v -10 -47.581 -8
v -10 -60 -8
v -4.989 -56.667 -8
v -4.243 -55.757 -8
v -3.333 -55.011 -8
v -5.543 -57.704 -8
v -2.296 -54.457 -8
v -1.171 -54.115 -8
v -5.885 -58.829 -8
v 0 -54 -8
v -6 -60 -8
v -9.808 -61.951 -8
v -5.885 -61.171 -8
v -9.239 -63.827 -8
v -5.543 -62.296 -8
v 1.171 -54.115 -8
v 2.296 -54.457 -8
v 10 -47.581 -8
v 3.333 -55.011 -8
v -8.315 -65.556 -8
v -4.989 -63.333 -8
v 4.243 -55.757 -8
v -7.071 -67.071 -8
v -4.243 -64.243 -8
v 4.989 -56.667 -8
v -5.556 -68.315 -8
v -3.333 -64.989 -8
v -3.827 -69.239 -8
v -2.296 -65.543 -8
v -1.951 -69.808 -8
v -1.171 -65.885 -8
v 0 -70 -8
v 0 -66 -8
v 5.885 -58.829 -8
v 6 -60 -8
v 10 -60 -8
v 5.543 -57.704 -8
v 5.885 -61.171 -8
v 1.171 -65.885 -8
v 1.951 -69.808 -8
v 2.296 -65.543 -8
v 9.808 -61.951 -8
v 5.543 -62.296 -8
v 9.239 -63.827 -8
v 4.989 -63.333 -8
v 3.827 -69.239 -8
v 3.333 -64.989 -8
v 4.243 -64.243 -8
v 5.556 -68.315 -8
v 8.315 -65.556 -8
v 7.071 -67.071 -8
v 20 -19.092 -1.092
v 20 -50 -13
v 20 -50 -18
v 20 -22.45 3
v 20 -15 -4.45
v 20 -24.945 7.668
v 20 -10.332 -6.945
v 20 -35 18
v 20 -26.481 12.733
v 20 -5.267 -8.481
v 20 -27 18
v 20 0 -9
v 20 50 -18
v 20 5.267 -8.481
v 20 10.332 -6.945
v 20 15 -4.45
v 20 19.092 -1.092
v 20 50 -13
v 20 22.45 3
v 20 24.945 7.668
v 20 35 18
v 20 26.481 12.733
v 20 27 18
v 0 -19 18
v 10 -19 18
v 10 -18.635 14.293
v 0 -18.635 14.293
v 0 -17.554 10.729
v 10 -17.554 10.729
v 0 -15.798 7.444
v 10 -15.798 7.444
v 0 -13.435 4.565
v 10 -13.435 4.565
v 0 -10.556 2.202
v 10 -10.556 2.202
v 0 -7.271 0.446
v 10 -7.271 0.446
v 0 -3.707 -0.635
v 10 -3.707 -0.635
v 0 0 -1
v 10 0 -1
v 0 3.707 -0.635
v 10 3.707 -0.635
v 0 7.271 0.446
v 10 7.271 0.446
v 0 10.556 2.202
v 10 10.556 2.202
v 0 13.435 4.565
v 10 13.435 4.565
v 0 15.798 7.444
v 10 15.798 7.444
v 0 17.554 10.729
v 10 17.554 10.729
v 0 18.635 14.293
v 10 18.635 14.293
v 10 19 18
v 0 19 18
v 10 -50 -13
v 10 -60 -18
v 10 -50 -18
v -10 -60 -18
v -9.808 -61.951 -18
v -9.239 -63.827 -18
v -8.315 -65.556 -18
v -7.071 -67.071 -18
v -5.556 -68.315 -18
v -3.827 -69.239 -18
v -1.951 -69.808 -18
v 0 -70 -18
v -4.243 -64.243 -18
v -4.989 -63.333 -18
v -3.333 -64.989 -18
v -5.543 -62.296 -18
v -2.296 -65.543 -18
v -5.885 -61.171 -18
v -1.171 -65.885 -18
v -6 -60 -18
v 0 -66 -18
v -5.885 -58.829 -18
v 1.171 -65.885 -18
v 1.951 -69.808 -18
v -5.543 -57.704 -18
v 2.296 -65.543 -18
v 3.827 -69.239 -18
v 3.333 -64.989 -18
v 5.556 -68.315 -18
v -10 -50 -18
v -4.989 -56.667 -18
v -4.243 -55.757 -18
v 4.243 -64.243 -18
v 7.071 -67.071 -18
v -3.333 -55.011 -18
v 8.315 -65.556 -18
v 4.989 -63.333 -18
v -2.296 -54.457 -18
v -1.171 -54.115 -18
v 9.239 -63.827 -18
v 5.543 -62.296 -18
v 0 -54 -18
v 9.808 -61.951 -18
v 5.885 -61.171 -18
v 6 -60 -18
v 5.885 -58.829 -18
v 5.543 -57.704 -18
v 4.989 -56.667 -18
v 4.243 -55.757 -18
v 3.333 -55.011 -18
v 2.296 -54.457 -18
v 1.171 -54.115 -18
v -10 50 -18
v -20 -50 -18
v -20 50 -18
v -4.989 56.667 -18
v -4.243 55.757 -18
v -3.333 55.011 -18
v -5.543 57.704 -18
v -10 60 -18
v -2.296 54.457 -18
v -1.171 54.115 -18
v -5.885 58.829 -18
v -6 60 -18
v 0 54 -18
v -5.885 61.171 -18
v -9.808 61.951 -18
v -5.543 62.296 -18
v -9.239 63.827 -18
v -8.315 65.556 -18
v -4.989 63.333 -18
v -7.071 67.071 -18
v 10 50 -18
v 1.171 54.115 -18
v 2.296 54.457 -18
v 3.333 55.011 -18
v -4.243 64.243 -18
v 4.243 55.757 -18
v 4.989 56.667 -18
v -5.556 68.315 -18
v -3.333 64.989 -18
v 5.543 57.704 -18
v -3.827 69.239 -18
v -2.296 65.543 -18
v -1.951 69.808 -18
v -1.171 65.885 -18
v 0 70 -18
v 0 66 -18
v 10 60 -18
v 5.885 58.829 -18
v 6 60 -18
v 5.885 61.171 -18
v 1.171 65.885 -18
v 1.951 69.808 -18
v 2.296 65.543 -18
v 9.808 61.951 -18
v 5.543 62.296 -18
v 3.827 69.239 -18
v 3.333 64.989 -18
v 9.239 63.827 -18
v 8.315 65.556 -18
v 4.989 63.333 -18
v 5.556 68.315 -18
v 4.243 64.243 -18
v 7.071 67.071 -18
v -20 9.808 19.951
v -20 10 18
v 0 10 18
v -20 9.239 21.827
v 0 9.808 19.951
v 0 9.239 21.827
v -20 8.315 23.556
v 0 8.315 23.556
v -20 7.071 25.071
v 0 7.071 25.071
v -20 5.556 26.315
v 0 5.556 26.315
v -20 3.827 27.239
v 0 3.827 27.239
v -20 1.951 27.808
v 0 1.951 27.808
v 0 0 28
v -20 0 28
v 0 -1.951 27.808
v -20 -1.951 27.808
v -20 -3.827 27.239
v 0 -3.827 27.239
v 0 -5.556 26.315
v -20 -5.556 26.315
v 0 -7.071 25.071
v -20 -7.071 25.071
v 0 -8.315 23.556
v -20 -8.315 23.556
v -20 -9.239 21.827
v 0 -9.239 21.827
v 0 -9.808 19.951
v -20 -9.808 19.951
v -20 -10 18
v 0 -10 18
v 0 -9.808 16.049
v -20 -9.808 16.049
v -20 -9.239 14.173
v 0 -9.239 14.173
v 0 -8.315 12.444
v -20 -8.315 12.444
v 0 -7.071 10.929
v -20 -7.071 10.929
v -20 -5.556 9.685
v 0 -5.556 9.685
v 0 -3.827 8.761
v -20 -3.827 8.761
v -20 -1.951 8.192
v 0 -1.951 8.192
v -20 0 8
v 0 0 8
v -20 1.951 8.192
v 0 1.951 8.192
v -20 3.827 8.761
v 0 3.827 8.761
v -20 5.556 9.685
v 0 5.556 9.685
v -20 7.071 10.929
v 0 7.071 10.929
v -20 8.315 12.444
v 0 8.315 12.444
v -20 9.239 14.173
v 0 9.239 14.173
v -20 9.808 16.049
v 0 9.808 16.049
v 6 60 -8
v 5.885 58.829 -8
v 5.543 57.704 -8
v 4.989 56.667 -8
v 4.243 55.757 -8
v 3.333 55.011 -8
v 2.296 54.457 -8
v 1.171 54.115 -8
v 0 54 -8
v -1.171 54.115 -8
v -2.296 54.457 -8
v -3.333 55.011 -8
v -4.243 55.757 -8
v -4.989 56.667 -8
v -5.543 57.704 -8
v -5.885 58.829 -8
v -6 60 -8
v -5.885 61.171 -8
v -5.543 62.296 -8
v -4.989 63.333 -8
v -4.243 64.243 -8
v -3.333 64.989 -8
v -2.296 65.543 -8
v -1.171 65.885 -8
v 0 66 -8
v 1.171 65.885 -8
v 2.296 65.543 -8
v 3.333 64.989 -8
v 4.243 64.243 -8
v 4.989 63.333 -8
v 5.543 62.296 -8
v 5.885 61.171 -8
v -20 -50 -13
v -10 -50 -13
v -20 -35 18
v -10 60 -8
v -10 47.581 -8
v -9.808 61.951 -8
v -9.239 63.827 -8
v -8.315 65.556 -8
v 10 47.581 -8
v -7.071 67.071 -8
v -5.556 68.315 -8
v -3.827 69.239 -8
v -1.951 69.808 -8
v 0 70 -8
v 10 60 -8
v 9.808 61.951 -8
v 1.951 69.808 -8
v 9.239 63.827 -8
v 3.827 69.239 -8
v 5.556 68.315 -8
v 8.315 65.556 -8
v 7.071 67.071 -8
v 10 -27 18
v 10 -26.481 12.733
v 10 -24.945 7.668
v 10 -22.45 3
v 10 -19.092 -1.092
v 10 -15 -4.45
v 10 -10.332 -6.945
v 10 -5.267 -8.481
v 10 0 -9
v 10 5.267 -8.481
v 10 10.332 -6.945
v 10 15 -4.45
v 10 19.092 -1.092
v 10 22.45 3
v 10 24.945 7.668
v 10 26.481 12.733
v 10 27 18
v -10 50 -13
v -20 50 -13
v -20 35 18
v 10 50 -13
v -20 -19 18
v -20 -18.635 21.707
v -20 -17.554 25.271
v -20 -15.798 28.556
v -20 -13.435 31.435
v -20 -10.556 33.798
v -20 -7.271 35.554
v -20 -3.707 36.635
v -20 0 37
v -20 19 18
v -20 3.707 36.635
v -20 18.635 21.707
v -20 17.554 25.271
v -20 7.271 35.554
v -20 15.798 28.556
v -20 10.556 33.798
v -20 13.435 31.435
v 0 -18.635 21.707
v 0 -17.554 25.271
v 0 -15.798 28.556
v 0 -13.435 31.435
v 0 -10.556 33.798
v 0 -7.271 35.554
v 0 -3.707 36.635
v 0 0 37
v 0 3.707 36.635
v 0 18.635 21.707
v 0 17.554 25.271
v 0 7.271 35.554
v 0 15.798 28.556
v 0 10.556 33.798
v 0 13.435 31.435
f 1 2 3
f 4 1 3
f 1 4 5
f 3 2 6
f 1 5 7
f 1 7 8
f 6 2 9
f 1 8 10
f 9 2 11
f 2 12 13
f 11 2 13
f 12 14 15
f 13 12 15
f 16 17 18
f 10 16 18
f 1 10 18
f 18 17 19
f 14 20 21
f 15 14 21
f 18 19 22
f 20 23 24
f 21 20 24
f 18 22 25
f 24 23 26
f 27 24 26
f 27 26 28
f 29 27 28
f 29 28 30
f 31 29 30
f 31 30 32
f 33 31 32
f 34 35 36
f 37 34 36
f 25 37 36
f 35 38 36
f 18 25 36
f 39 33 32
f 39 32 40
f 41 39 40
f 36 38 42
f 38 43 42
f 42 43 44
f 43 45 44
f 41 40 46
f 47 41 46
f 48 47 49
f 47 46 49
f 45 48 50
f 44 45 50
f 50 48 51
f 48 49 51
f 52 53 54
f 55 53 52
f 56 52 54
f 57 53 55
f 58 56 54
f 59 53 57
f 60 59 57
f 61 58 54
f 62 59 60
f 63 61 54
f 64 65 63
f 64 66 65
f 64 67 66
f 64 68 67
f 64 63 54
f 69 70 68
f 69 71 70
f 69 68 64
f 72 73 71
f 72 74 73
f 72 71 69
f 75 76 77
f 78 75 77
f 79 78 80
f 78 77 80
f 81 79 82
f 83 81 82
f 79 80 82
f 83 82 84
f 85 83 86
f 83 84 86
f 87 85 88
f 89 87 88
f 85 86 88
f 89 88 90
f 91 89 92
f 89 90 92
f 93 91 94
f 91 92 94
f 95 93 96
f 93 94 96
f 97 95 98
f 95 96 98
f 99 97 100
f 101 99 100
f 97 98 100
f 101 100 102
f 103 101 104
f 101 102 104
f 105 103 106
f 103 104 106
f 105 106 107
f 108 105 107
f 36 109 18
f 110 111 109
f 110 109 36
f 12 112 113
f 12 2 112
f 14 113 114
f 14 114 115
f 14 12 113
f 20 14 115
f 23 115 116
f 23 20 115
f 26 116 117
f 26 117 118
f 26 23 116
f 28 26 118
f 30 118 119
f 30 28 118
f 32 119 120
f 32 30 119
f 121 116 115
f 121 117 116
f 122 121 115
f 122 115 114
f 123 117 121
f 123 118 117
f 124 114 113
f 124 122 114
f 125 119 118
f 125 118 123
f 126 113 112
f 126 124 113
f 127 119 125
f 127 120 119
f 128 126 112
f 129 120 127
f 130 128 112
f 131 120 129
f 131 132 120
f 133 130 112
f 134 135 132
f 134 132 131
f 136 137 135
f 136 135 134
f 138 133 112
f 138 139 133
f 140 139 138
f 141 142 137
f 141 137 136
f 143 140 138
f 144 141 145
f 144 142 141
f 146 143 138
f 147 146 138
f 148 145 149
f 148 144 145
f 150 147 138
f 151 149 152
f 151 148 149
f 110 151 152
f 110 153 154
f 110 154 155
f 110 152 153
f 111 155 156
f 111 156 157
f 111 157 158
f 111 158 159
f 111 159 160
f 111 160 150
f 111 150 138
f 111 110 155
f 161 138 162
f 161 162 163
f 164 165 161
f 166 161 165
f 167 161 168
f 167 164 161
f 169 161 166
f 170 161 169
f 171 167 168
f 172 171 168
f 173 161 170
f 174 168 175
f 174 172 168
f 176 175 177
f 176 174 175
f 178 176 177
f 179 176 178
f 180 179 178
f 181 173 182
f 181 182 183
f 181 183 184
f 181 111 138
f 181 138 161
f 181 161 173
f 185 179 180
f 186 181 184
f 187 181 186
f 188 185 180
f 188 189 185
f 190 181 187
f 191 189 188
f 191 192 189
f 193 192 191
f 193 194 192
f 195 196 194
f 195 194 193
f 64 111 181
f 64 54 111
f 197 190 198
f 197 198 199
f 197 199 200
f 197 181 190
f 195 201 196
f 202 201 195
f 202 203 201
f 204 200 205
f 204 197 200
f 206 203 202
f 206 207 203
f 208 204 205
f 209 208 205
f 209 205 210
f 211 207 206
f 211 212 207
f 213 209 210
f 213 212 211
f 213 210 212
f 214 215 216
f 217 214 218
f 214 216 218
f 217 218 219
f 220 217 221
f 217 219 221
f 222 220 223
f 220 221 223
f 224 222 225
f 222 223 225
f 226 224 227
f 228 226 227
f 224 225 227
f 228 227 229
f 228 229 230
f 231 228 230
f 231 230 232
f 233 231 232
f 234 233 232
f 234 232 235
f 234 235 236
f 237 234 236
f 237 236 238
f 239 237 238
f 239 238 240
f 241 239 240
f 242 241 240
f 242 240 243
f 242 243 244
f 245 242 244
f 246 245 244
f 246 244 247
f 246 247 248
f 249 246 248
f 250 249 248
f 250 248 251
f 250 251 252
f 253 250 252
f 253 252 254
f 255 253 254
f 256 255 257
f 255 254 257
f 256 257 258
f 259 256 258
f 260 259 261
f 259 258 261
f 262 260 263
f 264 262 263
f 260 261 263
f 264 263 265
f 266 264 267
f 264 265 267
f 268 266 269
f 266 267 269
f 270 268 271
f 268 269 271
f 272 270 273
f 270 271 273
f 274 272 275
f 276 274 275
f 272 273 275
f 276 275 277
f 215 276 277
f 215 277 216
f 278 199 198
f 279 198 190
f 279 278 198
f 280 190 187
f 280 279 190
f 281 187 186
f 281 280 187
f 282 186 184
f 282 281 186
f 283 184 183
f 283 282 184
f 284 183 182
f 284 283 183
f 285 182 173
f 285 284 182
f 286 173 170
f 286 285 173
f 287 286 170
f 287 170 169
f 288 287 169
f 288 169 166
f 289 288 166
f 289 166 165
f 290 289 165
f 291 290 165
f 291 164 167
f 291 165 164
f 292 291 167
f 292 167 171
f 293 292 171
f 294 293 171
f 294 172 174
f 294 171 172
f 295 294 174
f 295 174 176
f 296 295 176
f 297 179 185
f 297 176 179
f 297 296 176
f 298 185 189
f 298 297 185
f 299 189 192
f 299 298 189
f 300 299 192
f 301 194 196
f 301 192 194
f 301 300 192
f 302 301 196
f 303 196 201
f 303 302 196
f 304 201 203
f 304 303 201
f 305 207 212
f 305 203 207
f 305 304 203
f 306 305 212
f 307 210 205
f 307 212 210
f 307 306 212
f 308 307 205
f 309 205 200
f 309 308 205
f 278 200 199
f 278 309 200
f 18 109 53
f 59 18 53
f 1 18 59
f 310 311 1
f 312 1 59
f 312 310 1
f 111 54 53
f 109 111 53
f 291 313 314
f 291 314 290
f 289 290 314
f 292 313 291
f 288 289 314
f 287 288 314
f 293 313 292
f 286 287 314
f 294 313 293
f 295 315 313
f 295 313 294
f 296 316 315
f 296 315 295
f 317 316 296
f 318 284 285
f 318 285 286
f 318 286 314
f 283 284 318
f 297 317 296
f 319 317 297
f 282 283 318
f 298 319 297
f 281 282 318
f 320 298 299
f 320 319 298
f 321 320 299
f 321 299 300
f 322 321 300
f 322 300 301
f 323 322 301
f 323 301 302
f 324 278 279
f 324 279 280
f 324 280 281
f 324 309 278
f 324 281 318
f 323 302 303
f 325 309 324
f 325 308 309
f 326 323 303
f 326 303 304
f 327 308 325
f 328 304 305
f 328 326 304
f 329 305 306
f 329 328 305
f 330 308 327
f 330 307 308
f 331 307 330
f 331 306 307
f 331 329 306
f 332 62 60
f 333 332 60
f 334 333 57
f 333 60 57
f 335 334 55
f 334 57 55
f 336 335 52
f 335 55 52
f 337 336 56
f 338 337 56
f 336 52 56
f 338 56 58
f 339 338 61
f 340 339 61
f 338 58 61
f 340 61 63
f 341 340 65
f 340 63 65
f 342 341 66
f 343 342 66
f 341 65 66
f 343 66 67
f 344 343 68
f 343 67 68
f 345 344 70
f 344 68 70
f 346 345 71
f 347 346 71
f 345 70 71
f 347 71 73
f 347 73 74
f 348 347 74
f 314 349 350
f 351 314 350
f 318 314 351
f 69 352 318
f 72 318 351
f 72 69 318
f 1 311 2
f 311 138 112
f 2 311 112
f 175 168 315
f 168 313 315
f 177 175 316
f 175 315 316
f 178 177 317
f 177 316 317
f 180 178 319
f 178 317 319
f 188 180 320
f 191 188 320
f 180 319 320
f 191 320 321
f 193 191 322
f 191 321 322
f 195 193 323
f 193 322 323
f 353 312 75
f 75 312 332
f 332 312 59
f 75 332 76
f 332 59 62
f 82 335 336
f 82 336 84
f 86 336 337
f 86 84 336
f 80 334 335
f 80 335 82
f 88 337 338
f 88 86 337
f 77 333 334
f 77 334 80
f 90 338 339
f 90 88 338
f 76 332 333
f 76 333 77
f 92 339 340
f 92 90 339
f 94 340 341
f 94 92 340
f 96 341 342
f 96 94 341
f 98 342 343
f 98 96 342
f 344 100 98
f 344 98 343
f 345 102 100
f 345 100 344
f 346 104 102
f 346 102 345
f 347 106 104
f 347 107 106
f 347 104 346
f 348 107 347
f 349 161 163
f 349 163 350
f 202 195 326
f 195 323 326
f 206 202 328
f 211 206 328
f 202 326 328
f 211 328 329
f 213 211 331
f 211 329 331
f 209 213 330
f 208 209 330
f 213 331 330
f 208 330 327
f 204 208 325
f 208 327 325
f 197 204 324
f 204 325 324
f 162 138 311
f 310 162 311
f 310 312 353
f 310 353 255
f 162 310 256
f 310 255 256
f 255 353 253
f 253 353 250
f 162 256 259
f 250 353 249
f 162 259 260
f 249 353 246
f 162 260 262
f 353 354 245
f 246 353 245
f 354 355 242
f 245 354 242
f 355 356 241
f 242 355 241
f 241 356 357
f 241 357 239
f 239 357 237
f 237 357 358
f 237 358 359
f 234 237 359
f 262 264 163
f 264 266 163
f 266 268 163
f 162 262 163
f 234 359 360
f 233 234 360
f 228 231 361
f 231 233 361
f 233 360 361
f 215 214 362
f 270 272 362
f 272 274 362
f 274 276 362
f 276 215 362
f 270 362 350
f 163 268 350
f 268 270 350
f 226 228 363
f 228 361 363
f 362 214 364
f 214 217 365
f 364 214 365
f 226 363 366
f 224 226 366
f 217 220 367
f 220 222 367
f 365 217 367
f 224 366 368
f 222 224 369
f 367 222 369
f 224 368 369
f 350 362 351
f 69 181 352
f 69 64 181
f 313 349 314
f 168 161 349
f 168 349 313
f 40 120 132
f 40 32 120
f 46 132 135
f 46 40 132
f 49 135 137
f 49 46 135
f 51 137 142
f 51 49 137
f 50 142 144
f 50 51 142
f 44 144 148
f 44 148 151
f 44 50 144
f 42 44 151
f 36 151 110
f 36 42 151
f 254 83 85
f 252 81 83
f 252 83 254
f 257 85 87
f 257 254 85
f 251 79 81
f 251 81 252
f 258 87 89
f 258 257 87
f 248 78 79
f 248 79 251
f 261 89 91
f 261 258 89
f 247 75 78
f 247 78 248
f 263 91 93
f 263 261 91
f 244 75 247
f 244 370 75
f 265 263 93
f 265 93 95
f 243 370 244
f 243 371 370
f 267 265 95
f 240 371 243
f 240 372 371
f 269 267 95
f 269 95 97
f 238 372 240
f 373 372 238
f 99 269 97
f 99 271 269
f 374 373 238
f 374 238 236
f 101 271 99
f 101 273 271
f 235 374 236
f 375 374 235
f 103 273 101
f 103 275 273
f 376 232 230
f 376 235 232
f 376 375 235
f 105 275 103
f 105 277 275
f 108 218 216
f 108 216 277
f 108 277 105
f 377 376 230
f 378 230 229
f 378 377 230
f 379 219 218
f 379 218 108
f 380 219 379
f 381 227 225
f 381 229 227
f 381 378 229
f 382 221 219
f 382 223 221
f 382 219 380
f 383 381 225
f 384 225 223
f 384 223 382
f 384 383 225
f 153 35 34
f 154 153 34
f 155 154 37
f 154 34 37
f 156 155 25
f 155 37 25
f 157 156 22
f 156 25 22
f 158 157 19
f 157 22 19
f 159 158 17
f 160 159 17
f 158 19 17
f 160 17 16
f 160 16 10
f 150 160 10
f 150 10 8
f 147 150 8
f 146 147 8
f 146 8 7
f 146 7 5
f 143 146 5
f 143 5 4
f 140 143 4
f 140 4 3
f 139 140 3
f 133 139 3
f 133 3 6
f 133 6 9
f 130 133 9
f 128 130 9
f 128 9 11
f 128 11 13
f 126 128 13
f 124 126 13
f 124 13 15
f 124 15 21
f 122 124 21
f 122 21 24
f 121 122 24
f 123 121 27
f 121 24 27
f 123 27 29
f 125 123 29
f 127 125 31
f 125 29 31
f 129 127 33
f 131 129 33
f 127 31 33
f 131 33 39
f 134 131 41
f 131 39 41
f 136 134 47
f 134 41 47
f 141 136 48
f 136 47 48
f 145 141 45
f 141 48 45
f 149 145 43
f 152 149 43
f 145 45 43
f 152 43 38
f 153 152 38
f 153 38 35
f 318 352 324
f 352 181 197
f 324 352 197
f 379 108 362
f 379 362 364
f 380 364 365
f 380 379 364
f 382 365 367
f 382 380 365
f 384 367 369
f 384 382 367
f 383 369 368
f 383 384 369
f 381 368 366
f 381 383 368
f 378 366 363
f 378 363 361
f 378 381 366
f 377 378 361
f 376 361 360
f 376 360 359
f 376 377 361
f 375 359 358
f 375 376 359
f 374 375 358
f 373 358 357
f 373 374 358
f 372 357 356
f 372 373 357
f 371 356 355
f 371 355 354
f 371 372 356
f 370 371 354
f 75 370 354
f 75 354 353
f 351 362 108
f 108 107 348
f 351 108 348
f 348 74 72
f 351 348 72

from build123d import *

# Parameters (mm, degrees)
F0_W         = 100
F0_H         = 36
F1_DEPTH     = 20
F2_W         = 20
F2_H         = 20
F3_DEPTH     = 10
F4_R         = 9.99999
F5_T4_DEPTH  = 200.6036926139
F5_T10_DEPTH = 200.6036926139
F5_T16_DEPTH = 200.6036926139
F5_T23_DEPTH = 200.6036926139
F5_T29_DEPTH = 200.6036926139
F6_R         = 6
F7_DEPTH     = 10.001
F8_T4_DEPTH  = 200.6036926139
F8_T10_DEPTH = 200.6036926139
F8_T16_DEPTH = 200.6036926139
F8_T23_DEPTH = 200.6036926139
F8_T29_DEPTH = 200.6036926139
F9_R         = 27
F10_DEPTH    = 10
F11_R        = 19
F12_DEPTH    = 10
F13_R        = 19
F14_DEPTH    = 20
F15_R        = 10
F16_DEPTH    = 20.001


# Not quite as in the source:
# - a fillet or chamfer that OpenCascade refuses, or shapes differently, is made with other operations: its cross-section is extruded or revolved along the edge and cut away or added
# - a fillet or chamfer is up to 0.001 mm smaller than in the source, because OpenCascade refuses the exact size
# - a pattern or mirror of a feature is missing from the dataset's text; its kind, count and spacing are read off the source's solid


with BuildPart() as f1:
    # F0 (on Right) → F1 (new body, symmetric)
    with BuildSketch(Plane.YZ):
        Rectangle(F0_W, F0_H)
    extrude(amount=F1_DEPTH, both=True)

    # F2 (on face) → F3 (join)
    with BuildSketch(Plane(origin=(0, 0, -18), x_dir=(1, 0, 0), z_dir=(0, 0, -1))):
        with Locations((0, 60)):
            Rectangle(F2_W, F2_H)
    f3 = extrude(amount=-F3_DEPTH)

    # F3_copies: F3 across plane
    add(f3.mirror(Plane.ZX.offset(-3e-06)))

    # F4 (radius 10 in the source; OpenCascade refuses exactly that, so slightly less here)
    f4_edges = [f1.edges().sort_by_distance(p)[0] for p in [
        (10, -70, -13),
        (-10, -70, -13),
        (-10, 69.999994, -13),
        (10, 69.999994, -13),
    ]]
    fillet(f4_edges, radius=F4_R)

    # F5: chamfer of 15 x 31 on 1 edges, made by hand


with BuildPart() as f5_tool2:
    # F5_s3 → F5_t4 (new body)
    with BuildSketch(Plane.YZ.offset(-100.301846307)):
        Polygon((-50, -13), (-35, 18), (-50, 18), align=None)
    extrude(amount=F5_T4_DEPTH)

    split(bisect_by=Plane.XY.offset(-8), keep=Keep.BOTTOM)

    split(bisect_by=Plane.YZ.offset(-10), keep=Keep.BOTTOM)


with BuildPart() as f1_1:
    add(f1.part)

    # F5_t1: cut F5_tool2
    add(f5_tool2.part, mode=Mode.SUBTRACT)


with BuildPart() as f5_tool8:
    # F5_s9 → F5_t10 (new body)
    with BuildSketch(Plane.YZ.offset(-100.301846307)):
        Polygon((-50, -13), (-35, 18), (-50, 18), align=None)
    extrude(amount=F5_T10_DEPTH)

    split(bisect_by=Plane.XY.offset(-8), keep=Keep.TOP)

    split(bisect_by=Plane.YZ.offset(-10), keep=Keep.BOTTOM)


with BuildPart() as f1_2:
    add(f1_1.part)

    # F5_t7: cut F5_tool8
    add(f5_tool8.part, mode=Mode.SUBTRACT)


with BuildPart() as f5_tool14:
    # F5_s15 → F5_t16 (new body)
    with BuildSketch(Plane.YZ.offset(-100.301846307)):
        Polygon((-50, -13), (-35, 18), (-50, 18), align=None)
    extrude(amount=F5_T16_DEPTH)

    split(bisect_by=Plane.YZ.offset(10), keep=Keep.BOTTOM)

    split(bisect_by=Plane.XY.offset(-8), keep=Keep.TOP)

    split(bisect_by=Plane.YZ.offset(-10), keep=Keep.TOP)


with BuildPart() as f1_3:
    add(f1_2.part)

    # F5_t13: cut F5_tool14
    add(f5_tool14.part, mode=Mode.SUBTRACT)


with BuildPart() as f5_tool21:
    # F5_s22 → F5_t23 (new body)
    with BuildSketch(Plane.YZ.offset(-100.301846307)):
        Polygon((-50, -13), (-35, 18), (-50, 18), align=None)
    extrude(amount=F5_T23_DEPTH)

    split(bisect_by=Plane.YZ.offset(10), keep=Keep.TOP)

    split(bisect_by=Plane.XY.offset(-8), keep=Keep.BOTTOM)


with BuildPart() as f1_4:
    add(f1_3.part)

    # F5_t20: cut F5_tool21
    add(f5_tool21.part, mode=Mode.SUBTRACT)


with BuildPart() as f5_tool27:
    # F5_s28 → F5_t29 (new body)
    with BuildSketch(Plane.YZ.offset(-100.301846307)):
        Polygon((-50, -13), (-35, 18), (-50, 18), align=None)
    extrude(amount=F5_T29_DEPTH)

    split(bisect_by=Plane.YZ.offset(10), keep=Keep.TOP)

    split(bisect_by=Plane.XY.offset(-8), keep=Keep.TOP)


with BuildPart() as f1_5:
    add(f1_4.part)

    # F5_t26: cut F5_tool27
    add(f5_tool27.part, mode=Mode.SUBTRACT)

    # F6 (on face) → F7 (cut, through all)
    with BuildSketch(Plane.XY.offset(-8)):
        with Locations((0, -60)):
            Circle(F6_R)
    f7 = extrude(amount=-F7_DEPTH, mode=Mode.SUBTRACT)

    # F7_copies: F7 across plane
    add(f7.mirror(Plane.ZX), mode=Mode.SUBTRACT)

    # F8: chamfer of 15 x 31 on 1 edges, made by hand


with BuildPart() as f8_tool2:
    # F8_s3 → F8_t4 (new body)
    with BuildSketch(Plane.YZ.offset(100.301846307)):
        Polygon((50, -13), (35, 18), (50, 18), align=None)
    extrude(amount=-F8_T4_DEPTH)

    split(bisect_by=Plane.XY.offset(-8), keep=Keep.BOTTOM)

    split(bisect_by=Plane.YZ.offset(10), keep=Keep.TOP)


with BuildPart() as f1_6:
    add(f1_5.part)

    # F8_t1: cut F8_tool2
    add(f8_tool2.part, mode=Mode.SUBTRACT)


with BuildPart() as f8_tool8:
    # F8_s9 → F8_t10 (new body)
    with BuildSketch(Plane.YZ.offset(100.301846307)):
        Polygon((50, -13), (35, 18), (50, 18), align=None)
    extrude(amount=-F8_T10_DEPTH)

    split(bisect_by=Plane.XY.offset(-8), keep=Keep.TOP)

    split(bisect_by=Plane.YZ.offset(10), keep=Keep.TOP)


with BuildPart() as f1_7:
    add(f1_6.part)

    # F8_t7: cut F8_tool8
    add(f8_tool8.part, mode=Mode.SUBTRACT)


with BuildPart() as f8_tool14:
    # F8_s15 → F8_t16 (new body)
    with BuildSketch(Plane.YZ.offset(100.301846307)):
        Polygon((50, -13), (35, 18), (50, 18), align=None)
    extrude(amount=-F8_T16_DEPTH)

    split(bisect_by=Plane.YZ.offset(-10), keep=Keep.TOP)

    split(bisect_by=Plane.XY.offset(-8), keep=Keep.TOP)

    split(bisect_by=Plane.YZ.offset(10), keep=Keep.BOTTOM)


with BuildPart() as f1_8:
    add(f1_7.part)

    # F8_t13: cut F8_tool14
    add(f8_tool14.part, mode=Mode.SUBTRACT)


with BuildPart() as f8_tool21:
    # F8_s22 → F8_t23 (new body)
    with BuildSketch(Plane.YZ.offset(100.301846307)):
        Polygon((50, -13), (35, 18), (50, 18), align=None)
    extrude(amount=-F8_T23_DEPTH)

    split(bisect_by=Plane.YZ.offset(-10), keep=Keep.BOTTOM)

    split(bisect_by=Plane.XY.offset(-8), keep=Keep.BOTTOM)


with BuildPart() as f1_9:
    add(f1_8.part)

    # F8_t20: cut F8_tool21
    add(f8_tool21.part, mode=Mode.SUBTRACT)


with BuildPart() as f8_tool27:
    # F8_s28 → F8_t29 (new body)
    with BuildSketch(Plane.YZ.offset(100.301846307)):
        Polygon((50, -13), (35, 18), (50, 18), align=None)
    extrude(amount=-F8_T29_DEPTH)

    split(bisect_by=Plane.YZ.offset(-10), keep=Keep.BOTTOM)

    split(bisect_by=Plane.XY.offset(-8), keep=Keep.TOP)


with BuildPart() as f1_10:
    add(f1_9.part)

    # F8_t26: cut F8_tool27
    add(f8_tool27.part, mode=Mode.SUBTRACT)

    # F9 (on face) → F10 (cut)
    with BuildSketch(Plane.YZ.offset(20)):
        with Locations((0, 18)):
            Circle(F9_R)
    extrude(amount=-F10_DEPTH, mode=Mode.SUBTRACT)

    # F11 (on face) → F12 (cut)
    with BuildSketch(Plane.YZ.offset(10)):
        with Locations((0, 18)):
            Circle(F11_R)
    extrude(amount=-F12_DEPTH, mode=Mode.SUBTRACT)

    # F13 (on face) → F14 (join)
    with BuildSketch(Plane.YZ):
        with Locations((0, 18)):
            Circle(F13_R)
    extrude(amount=-F14_DEPTH)

    # F15 (on face) → F16 (cut, through all)
    with BuildSketch(Plane.YZ):
        with Locations((0, 18)):
            Circle(F15_R)
    extrude(amount=-F16_DEPTH, mode=Mode.SUBTRACT)


solid = f1_10.part
